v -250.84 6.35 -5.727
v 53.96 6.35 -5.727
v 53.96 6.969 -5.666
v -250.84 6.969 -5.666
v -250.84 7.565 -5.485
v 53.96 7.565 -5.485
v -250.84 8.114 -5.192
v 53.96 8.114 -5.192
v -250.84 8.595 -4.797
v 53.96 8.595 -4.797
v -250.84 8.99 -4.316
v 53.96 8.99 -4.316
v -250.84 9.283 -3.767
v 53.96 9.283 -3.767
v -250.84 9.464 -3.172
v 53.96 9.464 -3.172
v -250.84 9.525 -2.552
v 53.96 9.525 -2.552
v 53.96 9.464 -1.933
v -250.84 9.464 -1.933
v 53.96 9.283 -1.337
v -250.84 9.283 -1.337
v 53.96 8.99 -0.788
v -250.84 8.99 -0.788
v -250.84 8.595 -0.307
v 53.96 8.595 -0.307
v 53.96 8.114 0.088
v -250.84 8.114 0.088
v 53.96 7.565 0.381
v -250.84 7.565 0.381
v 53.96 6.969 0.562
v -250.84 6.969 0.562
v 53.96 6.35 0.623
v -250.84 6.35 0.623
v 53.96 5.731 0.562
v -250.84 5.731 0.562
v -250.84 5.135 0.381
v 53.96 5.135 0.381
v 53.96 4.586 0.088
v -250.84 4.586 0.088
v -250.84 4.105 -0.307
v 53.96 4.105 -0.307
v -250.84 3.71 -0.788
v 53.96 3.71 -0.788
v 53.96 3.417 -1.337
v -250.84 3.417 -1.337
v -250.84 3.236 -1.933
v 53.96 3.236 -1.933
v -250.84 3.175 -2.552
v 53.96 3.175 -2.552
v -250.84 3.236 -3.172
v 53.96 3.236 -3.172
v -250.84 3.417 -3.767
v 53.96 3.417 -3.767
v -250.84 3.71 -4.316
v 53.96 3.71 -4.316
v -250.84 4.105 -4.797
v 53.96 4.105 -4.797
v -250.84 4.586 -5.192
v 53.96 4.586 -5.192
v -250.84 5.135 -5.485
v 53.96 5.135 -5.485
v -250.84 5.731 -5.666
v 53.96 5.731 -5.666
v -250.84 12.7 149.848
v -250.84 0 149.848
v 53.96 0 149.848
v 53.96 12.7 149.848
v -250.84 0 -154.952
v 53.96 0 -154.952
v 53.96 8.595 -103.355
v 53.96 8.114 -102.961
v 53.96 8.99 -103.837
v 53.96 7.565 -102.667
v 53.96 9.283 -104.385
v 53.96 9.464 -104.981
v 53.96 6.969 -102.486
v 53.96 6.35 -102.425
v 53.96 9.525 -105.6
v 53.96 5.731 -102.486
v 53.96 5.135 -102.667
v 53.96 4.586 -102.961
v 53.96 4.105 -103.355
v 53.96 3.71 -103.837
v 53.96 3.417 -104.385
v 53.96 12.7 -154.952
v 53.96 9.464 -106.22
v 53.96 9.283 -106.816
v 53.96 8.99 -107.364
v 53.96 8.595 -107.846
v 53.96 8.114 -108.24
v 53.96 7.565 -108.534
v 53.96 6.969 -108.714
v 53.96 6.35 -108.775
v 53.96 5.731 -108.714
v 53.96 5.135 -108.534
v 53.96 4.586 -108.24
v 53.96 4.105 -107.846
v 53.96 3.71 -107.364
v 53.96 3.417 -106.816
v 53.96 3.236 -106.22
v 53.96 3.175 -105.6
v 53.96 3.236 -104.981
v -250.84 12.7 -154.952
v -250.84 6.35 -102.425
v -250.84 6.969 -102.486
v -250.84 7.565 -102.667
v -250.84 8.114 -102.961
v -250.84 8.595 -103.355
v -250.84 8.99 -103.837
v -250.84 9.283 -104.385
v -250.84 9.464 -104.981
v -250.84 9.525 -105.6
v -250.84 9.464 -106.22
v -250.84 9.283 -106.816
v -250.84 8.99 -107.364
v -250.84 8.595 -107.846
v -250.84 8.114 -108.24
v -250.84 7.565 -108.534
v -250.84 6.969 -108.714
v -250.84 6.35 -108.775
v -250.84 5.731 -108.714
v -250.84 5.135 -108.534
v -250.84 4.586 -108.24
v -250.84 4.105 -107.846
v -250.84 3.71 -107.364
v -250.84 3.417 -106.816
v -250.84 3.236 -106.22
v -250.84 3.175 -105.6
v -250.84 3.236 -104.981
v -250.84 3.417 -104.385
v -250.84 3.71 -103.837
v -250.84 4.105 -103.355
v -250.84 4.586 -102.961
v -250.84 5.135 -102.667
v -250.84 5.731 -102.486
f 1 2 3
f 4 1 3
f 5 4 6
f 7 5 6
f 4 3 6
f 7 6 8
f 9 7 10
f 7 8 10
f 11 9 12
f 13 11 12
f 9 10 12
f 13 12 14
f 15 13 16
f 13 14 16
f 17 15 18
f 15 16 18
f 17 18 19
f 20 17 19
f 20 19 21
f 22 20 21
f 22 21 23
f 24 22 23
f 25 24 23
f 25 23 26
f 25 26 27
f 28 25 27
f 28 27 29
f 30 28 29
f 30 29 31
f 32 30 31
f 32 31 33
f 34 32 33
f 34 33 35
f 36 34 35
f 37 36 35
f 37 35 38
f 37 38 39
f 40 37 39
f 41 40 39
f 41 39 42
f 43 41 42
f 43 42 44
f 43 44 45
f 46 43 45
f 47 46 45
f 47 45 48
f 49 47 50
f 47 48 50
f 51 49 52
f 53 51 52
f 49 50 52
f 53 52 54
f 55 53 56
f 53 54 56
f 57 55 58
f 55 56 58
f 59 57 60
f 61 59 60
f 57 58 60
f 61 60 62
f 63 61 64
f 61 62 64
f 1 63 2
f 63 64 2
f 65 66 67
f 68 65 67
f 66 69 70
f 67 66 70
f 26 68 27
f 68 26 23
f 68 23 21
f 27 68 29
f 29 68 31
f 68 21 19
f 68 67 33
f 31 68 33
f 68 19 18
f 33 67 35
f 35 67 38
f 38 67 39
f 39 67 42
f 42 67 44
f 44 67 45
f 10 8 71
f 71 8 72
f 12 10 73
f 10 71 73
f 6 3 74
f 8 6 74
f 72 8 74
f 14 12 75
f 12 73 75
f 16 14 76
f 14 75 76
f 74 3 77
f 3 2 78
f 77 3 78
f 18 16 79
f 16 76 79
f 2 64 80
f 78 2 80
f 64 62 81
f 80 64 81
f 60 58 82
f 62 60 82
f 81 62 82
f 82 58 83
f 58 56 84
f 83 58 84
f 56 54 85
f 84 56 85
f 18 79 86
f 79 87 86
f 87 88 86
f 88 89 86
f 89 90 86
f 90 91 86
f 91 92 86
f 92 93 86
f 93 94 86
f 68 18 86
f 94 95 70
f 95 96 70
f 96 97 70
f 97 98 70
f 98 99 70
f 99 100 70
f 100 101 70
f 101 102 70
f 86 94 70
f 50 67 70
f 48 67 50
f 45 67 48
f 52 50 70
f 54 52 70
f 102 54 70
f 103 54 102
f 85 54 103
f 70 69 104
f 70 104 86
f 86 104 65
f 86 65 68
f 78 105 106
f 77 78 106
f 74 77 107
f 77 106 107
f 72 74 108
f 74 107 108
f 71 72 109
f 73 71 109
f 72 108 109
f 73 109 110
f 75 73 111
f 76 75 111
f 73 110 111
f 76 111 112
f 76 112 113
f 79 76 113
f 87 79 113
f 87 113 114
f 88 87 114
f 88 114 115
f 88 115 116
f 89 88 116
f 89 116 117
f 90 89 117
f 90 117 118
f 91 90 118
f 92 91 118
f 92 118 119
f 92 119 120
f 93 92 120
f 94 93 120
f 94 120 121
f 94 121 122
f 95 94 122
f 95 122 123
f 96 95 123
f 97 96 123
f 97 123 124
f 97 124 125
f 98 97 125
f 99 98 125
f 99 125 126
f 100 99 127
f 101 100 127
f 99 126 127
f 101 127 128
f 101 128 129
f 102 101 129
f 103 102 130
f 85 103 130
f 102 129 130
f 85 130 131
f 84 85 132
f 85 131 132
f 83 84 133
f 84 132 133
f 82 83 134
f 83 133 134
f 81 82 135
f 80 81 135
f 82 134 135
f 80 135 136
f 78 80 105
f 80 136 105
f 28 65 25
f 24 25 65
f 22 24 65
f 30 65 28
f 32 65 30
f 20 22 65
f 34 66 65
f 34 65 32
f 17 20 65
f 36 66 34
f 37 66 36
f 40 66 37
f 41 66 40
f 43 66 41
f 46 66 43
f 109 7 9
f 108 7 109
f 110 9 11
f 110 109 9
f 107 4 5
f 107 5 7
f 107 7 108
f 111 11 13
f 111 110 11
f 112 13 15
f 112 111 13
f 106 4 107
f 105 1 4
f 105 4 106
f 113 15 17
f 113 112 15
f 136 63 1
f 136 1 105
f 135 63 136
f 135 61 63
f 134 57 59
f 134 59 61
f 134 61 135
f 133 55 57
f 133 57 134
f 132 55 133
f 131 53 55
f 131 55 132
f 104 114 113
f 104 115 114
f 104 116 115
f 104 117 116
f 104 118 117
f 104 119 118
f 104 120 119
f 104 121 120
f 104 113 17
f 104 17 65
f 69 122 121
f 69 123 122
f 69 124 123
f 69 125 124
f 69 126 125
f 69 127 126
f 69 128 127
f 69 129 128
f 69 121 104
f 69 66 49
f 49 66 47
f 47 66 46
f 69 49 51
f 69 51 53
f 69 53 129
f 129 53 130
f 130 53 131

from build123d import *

# Parameters (mm, degrees)
SKETCH2_W           = 304.8
SKETCH2_H           = 304.8
BOSS_EXTRUDE1_DEPTH = 12.7
SKETCH3_R           = 3.175
CUT_EXTRUDE1_DEPTH  = 343.16151121
SKETCH4_R           = 3.175
CUT_EXTRUDE2_DEPTH  = 343.16151121


with BuildPart() as part:
    # Sketch2 → Boss-Extrude1 (new body)
    with BuildSketch(Plane(origin=(0, 0, 0), x_dir=(1, 0, 0), z_dir=(0, 1, 0))):
        with Locations((-98.440191388, 2.55215311)):
            Rectangle(SKETCH2_W, SKETCH2_H)
    extrude(amount=BOSS_EXTRUDE1_DEPTH)

    # Sketch3 → Cut-Extrude1 (cut, through all)
    with BuildSketch(Plane(origin=(53.959808612, 0, 0), x_dir=(0, 0, -1), z_dir=(1, 0, 0))):
        with Locations((2.55215311, 6.35)):
            Circle(SKETCH3_R)
    extrude(amount=-CUT_EXTRUDE1_DEPTH, mode=Mode.SUBTRACT)

    # Sketch4 → Cut-Extrude2 (cut, through all)
    with BuildSketch(Plane.ZY.offset(250.840191388)):
        with Locations((-105.600481839, 6.35)):
            Circle(SKETCH4_R)
    extrude(amount=-CUT_EXTRUDE2_DEPTH, mode=Mode.SUBTRACT)


solid = part.part
